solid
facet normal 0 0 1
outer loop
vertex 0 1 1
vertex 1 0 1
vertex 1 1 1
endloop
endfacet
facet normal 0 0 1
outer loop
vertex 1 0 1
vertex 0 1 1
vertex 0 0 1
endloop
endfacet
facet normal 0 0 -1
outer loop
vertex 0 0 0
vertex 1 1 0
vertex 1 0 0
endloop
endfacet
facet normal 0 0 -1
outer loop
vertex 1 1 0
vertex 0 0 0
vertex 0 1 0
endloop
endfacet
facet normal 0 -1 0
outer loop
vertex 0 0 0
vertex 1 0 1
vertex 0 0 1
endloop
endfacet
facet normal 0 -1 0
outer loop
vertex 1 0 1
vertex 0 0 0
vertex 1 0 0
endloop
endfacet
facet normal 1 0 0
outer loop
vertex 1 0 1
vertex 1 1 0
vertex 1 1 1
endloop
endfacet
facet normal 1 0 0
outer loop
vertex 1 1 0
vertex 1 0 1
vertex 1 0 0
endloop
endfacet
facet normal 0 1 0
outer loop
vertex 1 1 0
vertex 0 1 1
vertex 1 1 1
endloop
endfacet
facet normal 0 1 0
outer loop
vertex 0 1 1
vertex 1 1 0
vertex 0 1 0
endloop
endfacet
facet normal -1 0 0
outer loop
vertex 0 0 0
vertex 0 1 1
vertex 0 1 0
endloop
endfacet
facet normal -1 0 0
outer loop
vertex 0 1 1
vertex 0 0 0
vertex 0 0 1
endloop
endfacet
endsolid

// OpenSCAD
//%
cube(1);// echo(true);

//%
// garbage;
//%
// 'single quote
//%
// "double-quote
//%
